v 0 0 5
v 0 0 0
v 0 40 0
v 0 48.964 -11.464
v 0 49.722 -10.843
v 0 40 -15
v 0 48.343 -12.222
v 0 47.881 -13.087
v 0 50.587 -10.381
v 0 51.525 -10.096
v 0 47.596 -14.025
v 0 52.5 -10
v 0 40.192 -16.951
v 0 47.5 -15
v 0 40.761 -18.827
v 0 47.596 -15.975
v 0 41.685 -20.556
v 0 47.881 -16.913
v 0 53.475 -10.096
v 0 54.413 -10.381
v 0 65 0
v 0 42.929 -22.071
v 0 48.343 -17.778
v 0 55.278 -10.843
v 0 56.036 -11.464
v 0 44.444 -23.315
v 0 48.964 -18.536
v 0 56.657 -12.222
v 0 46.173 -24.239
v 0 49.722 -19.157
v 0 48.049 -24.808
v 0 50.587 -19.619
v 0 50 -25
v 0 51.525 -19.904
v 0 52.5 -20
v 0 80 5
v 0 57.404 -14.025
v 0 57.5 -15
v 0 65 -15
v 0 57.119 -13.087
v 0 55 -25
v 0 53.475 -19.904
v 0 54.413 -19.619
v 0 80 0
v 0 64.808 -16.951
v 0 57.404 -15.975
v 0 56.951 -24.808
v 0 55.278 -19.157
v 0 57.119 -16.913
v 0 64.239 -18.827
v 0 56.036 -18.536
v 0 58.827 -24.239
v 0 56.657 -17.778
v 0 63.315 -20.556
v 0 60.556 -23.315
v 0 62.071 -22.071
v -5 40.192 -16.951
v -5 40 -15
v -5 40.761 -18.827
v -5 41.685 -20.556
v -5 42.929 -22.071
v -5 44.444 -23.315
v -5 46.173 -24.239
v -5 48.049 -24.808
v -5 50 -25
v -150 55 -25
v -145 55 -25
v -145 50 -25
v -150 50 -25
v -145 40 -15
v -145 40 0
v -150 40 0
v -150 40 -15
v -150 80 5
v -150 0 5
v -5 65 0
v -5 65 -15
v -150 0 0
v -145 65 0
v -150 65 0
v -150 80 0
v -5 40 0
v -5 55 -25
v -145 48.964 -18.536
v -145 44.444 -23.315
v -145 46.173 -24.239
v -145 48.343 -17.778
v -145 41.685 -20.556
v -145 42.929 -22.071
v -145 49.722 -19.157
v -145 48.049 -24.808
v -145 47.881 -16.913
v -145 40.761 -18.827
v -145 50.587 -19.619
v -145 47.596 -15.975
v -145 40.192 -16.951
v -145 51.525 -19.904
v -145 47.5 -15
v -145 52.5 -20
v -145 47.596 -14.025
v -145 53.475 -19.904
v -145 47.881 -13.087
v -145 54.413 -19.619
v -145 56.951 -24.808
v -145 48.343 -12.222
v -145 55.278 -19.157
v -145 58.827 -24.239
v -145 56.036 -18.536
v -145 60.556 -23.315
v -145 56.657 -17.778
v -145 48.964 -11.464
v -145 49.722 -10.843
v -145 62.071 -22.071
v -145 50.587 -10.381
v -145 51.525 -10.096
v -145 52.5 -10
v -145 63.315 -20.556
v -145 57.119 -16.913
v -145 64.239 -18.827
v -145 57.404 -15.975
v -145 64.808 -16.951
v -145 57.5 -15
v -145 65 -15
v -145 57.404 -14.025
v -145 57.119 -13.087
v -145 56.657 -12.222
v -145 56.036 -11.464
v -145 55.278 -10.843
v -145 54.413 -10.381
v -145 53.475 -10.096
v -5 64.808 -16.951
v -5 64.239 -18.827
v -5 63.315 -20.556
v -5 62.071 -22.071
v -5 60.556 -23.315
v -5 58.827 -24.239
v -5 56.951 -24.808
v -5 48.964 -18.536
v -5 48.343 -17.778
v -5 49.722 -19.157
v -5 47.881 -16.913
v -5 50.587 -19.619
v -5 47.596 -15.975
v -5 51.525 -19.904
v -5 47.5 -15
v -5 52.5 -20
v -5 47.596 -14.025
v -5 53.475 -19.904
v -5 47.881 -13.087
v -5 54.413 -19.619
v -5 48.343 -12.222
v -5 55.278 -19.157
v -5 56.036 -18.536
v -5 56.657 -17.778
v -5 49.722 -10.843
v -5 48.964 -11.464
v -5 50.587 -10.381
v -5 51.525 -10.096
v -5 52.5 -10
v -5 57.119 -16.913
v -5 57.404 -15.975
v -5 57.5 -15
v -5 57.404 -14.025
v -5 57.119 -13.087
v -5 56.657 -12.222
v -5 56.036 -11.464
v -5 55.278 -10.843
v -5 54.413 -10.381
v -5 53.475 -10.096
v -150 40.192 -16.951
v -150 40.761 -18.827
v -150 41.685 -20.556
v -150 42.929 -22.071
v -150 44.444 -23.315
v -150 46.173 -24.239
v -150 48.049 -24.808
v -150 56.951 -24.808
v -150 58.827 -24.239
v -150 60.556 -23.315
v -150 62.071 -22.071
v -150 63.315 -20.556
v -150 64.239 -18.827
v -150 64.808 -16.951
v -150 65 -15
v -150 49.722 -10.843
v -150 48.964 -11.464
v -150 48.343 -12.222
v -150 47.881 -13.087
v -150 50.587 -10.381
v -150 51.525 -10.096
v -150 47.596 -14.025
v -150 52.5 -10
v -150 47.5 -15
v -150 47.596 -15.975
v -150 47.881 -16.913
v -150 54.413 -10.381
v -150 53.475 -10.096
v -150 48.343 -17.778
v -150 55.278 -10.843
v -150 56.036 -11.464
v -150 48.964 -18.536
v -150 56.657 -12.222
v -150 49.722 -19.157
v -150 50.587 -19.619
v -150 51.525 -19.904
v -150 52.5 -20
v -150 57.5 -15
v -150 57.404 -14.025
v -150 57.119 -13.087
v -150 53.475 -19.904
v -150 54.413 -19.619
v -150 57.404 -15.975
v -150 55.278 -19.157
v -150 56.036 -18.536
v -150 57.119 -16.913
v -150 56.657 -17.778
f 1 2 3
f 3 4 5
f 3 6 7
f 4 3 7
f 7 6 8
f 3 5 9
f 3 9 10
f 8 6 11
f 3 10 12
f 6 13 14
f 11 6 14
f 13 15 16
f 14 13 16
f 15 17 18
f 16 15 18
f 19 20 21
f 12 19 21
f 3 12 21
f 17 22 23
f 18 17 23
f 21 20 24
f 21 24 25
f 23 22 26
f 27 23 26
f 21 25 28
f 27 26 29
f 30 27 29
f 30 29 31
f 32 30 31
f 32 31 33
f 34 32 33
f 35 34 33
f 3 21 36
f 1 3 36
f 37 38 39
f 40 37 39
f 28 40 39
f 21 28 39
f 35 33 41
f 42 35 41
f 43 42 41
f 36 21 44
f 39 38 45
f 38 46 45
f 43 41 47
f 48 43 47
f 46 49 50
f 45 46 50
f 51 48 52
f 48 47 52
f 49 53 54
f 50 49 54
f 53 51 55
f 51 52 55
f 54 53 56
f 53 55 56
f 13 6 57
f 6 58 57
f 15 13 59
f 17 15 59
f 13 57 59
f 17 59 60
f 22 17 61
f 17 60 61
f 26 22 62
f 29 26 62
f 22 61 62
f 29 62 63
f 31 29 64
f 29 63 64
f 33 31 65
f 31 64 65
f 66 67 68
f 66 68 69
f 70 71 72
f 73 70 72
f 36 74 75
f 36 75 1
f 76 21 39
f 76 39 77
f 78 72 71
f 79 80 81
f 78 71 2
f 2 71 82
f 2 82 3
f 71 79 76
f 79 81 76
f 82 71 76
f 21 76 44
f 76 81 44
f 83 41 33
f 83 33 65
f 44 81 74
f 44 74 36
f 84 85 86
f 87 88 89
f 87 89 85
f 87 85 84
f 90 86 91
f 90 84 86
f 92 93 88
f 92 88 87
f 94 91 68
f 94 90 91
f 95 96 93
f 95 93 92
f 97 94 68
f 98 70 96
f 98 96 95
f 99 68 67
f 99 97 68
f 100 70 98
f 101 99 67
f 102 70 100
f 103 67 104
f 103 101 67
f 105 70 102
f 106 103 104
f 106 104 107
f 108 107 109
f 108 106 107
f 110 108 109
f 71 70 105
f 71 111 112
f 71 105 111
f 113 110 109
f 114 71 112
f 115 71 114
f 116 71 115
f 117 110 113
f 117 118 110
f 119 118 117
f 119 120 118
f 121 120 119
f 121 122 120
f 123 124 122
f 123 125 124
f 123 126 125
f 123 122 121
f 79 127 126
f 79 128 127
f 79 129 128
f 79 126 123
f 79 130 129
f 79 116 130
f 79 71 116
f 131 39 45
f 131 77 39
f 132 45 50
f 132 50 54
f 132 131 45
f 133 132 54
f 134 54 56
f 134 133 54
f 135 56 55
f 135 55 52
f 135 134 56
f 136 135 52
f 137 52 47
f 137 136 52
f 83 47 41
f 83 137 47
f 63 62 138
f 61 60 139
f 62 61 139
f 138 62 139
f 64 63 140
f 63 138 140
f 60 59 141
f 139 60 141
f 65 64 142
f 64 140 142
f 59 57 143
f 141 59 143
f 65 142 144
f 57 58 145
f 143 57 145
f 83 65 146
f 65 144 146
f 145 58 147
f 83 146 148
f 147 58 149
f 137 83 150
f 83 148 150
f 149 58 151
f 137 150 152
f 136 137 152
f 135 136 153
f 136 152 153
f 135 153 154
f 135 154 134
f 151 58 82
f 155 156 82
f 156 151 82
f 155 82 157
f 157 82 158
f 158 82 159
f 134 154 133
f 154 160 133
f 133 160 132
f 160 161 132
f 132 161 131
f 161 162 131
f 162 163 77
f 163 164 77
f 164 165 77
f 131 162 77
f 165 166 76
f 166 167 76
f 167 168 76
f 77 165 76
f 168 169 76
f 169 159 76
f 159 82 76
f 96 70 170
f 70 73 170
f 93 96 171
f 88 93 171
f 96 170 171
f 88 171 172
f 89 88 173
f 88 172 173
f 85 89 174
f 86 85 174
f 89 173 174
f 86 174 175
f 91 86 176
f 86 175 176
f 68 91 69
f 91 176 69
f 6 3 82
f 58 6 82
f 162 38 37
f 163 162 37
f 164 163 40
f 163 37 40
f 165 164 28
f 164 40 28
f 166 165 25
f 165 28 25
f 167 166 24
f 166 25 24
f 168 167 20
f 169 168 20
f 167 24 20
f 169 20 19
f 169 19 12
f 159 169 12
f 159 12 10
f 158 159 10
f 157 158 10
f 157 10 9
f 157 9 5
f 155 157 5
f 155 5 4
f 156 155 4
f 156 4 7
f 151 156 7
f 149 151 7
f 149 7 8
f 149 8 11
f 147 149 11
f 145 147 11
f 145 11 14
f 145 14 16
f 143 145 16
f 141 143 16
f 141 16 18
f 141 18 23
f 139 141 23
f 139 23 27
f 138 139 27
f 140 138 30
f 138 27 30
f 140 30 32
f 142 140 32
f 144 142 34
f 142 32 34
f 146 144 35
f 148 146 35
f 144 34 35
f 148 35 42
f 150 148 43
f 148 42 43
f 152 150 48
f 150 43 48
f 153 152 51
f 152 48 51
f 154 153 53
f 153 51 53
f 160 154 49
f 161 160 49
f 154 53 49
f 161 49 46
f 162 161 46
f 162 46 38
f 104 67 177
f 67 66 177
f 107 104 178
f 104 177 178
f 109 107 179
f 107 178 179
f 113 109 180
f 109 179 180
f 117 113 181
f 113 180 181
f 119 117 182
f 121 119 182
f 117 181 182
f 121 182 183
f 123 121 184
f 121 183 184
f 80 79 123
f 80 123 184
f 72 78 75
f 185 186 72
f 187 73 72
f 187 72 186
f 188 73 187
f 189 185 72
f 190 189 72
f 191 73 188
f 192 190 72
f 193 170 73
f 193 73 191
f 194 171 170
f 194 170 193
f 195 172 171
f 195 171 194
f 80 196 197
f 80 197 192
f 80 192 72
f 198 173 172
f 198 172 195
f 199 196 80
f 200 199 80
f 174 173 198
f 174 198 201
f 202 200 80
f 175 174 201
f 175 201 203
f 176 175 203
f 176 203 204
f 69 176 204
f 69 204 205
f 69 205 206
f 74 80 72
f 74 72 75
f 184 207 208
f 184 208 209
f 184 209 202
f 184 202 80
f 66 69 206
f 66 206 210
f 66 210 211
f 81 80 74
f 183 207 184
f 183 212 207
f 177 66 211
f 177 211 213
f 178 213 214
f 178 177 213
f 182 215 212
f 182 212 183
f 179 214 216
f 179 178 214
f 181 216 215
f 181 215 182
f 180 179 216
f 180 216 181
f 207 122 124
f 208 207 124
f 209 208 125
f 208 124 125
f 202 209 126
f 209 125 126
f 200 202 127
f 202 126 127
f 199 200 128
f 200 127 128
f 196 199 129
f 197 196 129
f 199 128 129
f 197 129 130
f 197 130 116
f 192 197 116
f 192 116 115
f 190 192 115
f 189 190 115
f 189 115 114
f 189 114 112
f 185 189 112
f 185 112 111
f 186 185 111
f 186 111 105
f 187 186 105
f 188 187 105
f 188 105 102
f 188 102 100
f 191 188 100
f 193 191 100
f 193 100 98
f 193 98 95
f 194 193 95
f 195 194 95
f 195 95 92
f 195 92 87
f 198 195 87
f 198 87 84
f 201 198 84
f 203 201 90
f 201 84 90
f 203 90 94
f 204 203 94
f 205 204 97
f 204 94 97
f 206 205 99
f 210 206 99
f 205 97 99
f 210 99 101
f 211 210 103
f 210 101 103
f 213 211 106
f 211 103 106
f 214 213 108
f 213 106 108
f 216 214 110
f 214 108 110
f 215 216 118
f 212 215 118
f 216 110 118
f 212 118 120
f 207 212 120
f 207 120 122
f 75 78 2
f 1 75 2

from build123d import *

# Parameters (mm, degrees)
SKETCH1_W           = 150
SKETCH1_H           = 80
BOSS_EXTRUDE1_DEPTH = 5
SKETCH2_W           = 5
SKETCH2_H           = 25
BOSS_EXTRUDE2_DEPTH = 25
SKETCH3_R           = 5
CUT_EXTRUDE1_DEPTH  = 151
FILLET1_R           = 10


with BuildPart() as part:
    # Sketch1 → Boss-Extrude1 (new body)
    with BuildSketch(Plane.XY):
        with Locations((-75, 40)):
            Rectangle(SKETCH1_W, SKETCH1_H)
    extrude(amount=BOSS_EXTRUDE1_DEPTH)

    # Sketch2 → Boss-Extrude2 (add)
    with BuildSketch(Plane(origin=(0, 0, 0), x_dir=(-1, 0, 0), z_dir=(0, 0, -1))):
        with Locations((2.5, 52.5)):
            Rectangle(SKETCH2_W, SKETCH2_H)
        with Locations((147.5, 52.5)):
            Rectangle(SKETCH2_W, SKETCH2_H)
    extrude(amount=BOSS_EXTRUDE2_DEPTH)

    # Sketch3 → Cut-Extrude1 (cut, through all)
    with BuildSketch(Plane(origin=(0, 0, 0), x_dir=(0, 0, -1), z_dir=(1, 0, 0))):
        with Locations(Location((15, 52.5, 0), (0, 0, 90))):  # turned: the seam where the file's is
            Circle(SKETCH3_R)
    extrude(amount=-CUT_EXTRUDE1_DEPTH, mode=Mode.SUBTRACT)

    # Fillet1
    fillet1_edges = [part.edges().sort_by_distance(p)[0] for p in [
        (-2.5, 40, -25),
        (-2.5, 65, -25),
        (-147.5, 65, -25),
        (-147.5, 40, -25),
    ]]
    fillet(fillet1_edges, radius=FILLET1_R)


solid = part.part
